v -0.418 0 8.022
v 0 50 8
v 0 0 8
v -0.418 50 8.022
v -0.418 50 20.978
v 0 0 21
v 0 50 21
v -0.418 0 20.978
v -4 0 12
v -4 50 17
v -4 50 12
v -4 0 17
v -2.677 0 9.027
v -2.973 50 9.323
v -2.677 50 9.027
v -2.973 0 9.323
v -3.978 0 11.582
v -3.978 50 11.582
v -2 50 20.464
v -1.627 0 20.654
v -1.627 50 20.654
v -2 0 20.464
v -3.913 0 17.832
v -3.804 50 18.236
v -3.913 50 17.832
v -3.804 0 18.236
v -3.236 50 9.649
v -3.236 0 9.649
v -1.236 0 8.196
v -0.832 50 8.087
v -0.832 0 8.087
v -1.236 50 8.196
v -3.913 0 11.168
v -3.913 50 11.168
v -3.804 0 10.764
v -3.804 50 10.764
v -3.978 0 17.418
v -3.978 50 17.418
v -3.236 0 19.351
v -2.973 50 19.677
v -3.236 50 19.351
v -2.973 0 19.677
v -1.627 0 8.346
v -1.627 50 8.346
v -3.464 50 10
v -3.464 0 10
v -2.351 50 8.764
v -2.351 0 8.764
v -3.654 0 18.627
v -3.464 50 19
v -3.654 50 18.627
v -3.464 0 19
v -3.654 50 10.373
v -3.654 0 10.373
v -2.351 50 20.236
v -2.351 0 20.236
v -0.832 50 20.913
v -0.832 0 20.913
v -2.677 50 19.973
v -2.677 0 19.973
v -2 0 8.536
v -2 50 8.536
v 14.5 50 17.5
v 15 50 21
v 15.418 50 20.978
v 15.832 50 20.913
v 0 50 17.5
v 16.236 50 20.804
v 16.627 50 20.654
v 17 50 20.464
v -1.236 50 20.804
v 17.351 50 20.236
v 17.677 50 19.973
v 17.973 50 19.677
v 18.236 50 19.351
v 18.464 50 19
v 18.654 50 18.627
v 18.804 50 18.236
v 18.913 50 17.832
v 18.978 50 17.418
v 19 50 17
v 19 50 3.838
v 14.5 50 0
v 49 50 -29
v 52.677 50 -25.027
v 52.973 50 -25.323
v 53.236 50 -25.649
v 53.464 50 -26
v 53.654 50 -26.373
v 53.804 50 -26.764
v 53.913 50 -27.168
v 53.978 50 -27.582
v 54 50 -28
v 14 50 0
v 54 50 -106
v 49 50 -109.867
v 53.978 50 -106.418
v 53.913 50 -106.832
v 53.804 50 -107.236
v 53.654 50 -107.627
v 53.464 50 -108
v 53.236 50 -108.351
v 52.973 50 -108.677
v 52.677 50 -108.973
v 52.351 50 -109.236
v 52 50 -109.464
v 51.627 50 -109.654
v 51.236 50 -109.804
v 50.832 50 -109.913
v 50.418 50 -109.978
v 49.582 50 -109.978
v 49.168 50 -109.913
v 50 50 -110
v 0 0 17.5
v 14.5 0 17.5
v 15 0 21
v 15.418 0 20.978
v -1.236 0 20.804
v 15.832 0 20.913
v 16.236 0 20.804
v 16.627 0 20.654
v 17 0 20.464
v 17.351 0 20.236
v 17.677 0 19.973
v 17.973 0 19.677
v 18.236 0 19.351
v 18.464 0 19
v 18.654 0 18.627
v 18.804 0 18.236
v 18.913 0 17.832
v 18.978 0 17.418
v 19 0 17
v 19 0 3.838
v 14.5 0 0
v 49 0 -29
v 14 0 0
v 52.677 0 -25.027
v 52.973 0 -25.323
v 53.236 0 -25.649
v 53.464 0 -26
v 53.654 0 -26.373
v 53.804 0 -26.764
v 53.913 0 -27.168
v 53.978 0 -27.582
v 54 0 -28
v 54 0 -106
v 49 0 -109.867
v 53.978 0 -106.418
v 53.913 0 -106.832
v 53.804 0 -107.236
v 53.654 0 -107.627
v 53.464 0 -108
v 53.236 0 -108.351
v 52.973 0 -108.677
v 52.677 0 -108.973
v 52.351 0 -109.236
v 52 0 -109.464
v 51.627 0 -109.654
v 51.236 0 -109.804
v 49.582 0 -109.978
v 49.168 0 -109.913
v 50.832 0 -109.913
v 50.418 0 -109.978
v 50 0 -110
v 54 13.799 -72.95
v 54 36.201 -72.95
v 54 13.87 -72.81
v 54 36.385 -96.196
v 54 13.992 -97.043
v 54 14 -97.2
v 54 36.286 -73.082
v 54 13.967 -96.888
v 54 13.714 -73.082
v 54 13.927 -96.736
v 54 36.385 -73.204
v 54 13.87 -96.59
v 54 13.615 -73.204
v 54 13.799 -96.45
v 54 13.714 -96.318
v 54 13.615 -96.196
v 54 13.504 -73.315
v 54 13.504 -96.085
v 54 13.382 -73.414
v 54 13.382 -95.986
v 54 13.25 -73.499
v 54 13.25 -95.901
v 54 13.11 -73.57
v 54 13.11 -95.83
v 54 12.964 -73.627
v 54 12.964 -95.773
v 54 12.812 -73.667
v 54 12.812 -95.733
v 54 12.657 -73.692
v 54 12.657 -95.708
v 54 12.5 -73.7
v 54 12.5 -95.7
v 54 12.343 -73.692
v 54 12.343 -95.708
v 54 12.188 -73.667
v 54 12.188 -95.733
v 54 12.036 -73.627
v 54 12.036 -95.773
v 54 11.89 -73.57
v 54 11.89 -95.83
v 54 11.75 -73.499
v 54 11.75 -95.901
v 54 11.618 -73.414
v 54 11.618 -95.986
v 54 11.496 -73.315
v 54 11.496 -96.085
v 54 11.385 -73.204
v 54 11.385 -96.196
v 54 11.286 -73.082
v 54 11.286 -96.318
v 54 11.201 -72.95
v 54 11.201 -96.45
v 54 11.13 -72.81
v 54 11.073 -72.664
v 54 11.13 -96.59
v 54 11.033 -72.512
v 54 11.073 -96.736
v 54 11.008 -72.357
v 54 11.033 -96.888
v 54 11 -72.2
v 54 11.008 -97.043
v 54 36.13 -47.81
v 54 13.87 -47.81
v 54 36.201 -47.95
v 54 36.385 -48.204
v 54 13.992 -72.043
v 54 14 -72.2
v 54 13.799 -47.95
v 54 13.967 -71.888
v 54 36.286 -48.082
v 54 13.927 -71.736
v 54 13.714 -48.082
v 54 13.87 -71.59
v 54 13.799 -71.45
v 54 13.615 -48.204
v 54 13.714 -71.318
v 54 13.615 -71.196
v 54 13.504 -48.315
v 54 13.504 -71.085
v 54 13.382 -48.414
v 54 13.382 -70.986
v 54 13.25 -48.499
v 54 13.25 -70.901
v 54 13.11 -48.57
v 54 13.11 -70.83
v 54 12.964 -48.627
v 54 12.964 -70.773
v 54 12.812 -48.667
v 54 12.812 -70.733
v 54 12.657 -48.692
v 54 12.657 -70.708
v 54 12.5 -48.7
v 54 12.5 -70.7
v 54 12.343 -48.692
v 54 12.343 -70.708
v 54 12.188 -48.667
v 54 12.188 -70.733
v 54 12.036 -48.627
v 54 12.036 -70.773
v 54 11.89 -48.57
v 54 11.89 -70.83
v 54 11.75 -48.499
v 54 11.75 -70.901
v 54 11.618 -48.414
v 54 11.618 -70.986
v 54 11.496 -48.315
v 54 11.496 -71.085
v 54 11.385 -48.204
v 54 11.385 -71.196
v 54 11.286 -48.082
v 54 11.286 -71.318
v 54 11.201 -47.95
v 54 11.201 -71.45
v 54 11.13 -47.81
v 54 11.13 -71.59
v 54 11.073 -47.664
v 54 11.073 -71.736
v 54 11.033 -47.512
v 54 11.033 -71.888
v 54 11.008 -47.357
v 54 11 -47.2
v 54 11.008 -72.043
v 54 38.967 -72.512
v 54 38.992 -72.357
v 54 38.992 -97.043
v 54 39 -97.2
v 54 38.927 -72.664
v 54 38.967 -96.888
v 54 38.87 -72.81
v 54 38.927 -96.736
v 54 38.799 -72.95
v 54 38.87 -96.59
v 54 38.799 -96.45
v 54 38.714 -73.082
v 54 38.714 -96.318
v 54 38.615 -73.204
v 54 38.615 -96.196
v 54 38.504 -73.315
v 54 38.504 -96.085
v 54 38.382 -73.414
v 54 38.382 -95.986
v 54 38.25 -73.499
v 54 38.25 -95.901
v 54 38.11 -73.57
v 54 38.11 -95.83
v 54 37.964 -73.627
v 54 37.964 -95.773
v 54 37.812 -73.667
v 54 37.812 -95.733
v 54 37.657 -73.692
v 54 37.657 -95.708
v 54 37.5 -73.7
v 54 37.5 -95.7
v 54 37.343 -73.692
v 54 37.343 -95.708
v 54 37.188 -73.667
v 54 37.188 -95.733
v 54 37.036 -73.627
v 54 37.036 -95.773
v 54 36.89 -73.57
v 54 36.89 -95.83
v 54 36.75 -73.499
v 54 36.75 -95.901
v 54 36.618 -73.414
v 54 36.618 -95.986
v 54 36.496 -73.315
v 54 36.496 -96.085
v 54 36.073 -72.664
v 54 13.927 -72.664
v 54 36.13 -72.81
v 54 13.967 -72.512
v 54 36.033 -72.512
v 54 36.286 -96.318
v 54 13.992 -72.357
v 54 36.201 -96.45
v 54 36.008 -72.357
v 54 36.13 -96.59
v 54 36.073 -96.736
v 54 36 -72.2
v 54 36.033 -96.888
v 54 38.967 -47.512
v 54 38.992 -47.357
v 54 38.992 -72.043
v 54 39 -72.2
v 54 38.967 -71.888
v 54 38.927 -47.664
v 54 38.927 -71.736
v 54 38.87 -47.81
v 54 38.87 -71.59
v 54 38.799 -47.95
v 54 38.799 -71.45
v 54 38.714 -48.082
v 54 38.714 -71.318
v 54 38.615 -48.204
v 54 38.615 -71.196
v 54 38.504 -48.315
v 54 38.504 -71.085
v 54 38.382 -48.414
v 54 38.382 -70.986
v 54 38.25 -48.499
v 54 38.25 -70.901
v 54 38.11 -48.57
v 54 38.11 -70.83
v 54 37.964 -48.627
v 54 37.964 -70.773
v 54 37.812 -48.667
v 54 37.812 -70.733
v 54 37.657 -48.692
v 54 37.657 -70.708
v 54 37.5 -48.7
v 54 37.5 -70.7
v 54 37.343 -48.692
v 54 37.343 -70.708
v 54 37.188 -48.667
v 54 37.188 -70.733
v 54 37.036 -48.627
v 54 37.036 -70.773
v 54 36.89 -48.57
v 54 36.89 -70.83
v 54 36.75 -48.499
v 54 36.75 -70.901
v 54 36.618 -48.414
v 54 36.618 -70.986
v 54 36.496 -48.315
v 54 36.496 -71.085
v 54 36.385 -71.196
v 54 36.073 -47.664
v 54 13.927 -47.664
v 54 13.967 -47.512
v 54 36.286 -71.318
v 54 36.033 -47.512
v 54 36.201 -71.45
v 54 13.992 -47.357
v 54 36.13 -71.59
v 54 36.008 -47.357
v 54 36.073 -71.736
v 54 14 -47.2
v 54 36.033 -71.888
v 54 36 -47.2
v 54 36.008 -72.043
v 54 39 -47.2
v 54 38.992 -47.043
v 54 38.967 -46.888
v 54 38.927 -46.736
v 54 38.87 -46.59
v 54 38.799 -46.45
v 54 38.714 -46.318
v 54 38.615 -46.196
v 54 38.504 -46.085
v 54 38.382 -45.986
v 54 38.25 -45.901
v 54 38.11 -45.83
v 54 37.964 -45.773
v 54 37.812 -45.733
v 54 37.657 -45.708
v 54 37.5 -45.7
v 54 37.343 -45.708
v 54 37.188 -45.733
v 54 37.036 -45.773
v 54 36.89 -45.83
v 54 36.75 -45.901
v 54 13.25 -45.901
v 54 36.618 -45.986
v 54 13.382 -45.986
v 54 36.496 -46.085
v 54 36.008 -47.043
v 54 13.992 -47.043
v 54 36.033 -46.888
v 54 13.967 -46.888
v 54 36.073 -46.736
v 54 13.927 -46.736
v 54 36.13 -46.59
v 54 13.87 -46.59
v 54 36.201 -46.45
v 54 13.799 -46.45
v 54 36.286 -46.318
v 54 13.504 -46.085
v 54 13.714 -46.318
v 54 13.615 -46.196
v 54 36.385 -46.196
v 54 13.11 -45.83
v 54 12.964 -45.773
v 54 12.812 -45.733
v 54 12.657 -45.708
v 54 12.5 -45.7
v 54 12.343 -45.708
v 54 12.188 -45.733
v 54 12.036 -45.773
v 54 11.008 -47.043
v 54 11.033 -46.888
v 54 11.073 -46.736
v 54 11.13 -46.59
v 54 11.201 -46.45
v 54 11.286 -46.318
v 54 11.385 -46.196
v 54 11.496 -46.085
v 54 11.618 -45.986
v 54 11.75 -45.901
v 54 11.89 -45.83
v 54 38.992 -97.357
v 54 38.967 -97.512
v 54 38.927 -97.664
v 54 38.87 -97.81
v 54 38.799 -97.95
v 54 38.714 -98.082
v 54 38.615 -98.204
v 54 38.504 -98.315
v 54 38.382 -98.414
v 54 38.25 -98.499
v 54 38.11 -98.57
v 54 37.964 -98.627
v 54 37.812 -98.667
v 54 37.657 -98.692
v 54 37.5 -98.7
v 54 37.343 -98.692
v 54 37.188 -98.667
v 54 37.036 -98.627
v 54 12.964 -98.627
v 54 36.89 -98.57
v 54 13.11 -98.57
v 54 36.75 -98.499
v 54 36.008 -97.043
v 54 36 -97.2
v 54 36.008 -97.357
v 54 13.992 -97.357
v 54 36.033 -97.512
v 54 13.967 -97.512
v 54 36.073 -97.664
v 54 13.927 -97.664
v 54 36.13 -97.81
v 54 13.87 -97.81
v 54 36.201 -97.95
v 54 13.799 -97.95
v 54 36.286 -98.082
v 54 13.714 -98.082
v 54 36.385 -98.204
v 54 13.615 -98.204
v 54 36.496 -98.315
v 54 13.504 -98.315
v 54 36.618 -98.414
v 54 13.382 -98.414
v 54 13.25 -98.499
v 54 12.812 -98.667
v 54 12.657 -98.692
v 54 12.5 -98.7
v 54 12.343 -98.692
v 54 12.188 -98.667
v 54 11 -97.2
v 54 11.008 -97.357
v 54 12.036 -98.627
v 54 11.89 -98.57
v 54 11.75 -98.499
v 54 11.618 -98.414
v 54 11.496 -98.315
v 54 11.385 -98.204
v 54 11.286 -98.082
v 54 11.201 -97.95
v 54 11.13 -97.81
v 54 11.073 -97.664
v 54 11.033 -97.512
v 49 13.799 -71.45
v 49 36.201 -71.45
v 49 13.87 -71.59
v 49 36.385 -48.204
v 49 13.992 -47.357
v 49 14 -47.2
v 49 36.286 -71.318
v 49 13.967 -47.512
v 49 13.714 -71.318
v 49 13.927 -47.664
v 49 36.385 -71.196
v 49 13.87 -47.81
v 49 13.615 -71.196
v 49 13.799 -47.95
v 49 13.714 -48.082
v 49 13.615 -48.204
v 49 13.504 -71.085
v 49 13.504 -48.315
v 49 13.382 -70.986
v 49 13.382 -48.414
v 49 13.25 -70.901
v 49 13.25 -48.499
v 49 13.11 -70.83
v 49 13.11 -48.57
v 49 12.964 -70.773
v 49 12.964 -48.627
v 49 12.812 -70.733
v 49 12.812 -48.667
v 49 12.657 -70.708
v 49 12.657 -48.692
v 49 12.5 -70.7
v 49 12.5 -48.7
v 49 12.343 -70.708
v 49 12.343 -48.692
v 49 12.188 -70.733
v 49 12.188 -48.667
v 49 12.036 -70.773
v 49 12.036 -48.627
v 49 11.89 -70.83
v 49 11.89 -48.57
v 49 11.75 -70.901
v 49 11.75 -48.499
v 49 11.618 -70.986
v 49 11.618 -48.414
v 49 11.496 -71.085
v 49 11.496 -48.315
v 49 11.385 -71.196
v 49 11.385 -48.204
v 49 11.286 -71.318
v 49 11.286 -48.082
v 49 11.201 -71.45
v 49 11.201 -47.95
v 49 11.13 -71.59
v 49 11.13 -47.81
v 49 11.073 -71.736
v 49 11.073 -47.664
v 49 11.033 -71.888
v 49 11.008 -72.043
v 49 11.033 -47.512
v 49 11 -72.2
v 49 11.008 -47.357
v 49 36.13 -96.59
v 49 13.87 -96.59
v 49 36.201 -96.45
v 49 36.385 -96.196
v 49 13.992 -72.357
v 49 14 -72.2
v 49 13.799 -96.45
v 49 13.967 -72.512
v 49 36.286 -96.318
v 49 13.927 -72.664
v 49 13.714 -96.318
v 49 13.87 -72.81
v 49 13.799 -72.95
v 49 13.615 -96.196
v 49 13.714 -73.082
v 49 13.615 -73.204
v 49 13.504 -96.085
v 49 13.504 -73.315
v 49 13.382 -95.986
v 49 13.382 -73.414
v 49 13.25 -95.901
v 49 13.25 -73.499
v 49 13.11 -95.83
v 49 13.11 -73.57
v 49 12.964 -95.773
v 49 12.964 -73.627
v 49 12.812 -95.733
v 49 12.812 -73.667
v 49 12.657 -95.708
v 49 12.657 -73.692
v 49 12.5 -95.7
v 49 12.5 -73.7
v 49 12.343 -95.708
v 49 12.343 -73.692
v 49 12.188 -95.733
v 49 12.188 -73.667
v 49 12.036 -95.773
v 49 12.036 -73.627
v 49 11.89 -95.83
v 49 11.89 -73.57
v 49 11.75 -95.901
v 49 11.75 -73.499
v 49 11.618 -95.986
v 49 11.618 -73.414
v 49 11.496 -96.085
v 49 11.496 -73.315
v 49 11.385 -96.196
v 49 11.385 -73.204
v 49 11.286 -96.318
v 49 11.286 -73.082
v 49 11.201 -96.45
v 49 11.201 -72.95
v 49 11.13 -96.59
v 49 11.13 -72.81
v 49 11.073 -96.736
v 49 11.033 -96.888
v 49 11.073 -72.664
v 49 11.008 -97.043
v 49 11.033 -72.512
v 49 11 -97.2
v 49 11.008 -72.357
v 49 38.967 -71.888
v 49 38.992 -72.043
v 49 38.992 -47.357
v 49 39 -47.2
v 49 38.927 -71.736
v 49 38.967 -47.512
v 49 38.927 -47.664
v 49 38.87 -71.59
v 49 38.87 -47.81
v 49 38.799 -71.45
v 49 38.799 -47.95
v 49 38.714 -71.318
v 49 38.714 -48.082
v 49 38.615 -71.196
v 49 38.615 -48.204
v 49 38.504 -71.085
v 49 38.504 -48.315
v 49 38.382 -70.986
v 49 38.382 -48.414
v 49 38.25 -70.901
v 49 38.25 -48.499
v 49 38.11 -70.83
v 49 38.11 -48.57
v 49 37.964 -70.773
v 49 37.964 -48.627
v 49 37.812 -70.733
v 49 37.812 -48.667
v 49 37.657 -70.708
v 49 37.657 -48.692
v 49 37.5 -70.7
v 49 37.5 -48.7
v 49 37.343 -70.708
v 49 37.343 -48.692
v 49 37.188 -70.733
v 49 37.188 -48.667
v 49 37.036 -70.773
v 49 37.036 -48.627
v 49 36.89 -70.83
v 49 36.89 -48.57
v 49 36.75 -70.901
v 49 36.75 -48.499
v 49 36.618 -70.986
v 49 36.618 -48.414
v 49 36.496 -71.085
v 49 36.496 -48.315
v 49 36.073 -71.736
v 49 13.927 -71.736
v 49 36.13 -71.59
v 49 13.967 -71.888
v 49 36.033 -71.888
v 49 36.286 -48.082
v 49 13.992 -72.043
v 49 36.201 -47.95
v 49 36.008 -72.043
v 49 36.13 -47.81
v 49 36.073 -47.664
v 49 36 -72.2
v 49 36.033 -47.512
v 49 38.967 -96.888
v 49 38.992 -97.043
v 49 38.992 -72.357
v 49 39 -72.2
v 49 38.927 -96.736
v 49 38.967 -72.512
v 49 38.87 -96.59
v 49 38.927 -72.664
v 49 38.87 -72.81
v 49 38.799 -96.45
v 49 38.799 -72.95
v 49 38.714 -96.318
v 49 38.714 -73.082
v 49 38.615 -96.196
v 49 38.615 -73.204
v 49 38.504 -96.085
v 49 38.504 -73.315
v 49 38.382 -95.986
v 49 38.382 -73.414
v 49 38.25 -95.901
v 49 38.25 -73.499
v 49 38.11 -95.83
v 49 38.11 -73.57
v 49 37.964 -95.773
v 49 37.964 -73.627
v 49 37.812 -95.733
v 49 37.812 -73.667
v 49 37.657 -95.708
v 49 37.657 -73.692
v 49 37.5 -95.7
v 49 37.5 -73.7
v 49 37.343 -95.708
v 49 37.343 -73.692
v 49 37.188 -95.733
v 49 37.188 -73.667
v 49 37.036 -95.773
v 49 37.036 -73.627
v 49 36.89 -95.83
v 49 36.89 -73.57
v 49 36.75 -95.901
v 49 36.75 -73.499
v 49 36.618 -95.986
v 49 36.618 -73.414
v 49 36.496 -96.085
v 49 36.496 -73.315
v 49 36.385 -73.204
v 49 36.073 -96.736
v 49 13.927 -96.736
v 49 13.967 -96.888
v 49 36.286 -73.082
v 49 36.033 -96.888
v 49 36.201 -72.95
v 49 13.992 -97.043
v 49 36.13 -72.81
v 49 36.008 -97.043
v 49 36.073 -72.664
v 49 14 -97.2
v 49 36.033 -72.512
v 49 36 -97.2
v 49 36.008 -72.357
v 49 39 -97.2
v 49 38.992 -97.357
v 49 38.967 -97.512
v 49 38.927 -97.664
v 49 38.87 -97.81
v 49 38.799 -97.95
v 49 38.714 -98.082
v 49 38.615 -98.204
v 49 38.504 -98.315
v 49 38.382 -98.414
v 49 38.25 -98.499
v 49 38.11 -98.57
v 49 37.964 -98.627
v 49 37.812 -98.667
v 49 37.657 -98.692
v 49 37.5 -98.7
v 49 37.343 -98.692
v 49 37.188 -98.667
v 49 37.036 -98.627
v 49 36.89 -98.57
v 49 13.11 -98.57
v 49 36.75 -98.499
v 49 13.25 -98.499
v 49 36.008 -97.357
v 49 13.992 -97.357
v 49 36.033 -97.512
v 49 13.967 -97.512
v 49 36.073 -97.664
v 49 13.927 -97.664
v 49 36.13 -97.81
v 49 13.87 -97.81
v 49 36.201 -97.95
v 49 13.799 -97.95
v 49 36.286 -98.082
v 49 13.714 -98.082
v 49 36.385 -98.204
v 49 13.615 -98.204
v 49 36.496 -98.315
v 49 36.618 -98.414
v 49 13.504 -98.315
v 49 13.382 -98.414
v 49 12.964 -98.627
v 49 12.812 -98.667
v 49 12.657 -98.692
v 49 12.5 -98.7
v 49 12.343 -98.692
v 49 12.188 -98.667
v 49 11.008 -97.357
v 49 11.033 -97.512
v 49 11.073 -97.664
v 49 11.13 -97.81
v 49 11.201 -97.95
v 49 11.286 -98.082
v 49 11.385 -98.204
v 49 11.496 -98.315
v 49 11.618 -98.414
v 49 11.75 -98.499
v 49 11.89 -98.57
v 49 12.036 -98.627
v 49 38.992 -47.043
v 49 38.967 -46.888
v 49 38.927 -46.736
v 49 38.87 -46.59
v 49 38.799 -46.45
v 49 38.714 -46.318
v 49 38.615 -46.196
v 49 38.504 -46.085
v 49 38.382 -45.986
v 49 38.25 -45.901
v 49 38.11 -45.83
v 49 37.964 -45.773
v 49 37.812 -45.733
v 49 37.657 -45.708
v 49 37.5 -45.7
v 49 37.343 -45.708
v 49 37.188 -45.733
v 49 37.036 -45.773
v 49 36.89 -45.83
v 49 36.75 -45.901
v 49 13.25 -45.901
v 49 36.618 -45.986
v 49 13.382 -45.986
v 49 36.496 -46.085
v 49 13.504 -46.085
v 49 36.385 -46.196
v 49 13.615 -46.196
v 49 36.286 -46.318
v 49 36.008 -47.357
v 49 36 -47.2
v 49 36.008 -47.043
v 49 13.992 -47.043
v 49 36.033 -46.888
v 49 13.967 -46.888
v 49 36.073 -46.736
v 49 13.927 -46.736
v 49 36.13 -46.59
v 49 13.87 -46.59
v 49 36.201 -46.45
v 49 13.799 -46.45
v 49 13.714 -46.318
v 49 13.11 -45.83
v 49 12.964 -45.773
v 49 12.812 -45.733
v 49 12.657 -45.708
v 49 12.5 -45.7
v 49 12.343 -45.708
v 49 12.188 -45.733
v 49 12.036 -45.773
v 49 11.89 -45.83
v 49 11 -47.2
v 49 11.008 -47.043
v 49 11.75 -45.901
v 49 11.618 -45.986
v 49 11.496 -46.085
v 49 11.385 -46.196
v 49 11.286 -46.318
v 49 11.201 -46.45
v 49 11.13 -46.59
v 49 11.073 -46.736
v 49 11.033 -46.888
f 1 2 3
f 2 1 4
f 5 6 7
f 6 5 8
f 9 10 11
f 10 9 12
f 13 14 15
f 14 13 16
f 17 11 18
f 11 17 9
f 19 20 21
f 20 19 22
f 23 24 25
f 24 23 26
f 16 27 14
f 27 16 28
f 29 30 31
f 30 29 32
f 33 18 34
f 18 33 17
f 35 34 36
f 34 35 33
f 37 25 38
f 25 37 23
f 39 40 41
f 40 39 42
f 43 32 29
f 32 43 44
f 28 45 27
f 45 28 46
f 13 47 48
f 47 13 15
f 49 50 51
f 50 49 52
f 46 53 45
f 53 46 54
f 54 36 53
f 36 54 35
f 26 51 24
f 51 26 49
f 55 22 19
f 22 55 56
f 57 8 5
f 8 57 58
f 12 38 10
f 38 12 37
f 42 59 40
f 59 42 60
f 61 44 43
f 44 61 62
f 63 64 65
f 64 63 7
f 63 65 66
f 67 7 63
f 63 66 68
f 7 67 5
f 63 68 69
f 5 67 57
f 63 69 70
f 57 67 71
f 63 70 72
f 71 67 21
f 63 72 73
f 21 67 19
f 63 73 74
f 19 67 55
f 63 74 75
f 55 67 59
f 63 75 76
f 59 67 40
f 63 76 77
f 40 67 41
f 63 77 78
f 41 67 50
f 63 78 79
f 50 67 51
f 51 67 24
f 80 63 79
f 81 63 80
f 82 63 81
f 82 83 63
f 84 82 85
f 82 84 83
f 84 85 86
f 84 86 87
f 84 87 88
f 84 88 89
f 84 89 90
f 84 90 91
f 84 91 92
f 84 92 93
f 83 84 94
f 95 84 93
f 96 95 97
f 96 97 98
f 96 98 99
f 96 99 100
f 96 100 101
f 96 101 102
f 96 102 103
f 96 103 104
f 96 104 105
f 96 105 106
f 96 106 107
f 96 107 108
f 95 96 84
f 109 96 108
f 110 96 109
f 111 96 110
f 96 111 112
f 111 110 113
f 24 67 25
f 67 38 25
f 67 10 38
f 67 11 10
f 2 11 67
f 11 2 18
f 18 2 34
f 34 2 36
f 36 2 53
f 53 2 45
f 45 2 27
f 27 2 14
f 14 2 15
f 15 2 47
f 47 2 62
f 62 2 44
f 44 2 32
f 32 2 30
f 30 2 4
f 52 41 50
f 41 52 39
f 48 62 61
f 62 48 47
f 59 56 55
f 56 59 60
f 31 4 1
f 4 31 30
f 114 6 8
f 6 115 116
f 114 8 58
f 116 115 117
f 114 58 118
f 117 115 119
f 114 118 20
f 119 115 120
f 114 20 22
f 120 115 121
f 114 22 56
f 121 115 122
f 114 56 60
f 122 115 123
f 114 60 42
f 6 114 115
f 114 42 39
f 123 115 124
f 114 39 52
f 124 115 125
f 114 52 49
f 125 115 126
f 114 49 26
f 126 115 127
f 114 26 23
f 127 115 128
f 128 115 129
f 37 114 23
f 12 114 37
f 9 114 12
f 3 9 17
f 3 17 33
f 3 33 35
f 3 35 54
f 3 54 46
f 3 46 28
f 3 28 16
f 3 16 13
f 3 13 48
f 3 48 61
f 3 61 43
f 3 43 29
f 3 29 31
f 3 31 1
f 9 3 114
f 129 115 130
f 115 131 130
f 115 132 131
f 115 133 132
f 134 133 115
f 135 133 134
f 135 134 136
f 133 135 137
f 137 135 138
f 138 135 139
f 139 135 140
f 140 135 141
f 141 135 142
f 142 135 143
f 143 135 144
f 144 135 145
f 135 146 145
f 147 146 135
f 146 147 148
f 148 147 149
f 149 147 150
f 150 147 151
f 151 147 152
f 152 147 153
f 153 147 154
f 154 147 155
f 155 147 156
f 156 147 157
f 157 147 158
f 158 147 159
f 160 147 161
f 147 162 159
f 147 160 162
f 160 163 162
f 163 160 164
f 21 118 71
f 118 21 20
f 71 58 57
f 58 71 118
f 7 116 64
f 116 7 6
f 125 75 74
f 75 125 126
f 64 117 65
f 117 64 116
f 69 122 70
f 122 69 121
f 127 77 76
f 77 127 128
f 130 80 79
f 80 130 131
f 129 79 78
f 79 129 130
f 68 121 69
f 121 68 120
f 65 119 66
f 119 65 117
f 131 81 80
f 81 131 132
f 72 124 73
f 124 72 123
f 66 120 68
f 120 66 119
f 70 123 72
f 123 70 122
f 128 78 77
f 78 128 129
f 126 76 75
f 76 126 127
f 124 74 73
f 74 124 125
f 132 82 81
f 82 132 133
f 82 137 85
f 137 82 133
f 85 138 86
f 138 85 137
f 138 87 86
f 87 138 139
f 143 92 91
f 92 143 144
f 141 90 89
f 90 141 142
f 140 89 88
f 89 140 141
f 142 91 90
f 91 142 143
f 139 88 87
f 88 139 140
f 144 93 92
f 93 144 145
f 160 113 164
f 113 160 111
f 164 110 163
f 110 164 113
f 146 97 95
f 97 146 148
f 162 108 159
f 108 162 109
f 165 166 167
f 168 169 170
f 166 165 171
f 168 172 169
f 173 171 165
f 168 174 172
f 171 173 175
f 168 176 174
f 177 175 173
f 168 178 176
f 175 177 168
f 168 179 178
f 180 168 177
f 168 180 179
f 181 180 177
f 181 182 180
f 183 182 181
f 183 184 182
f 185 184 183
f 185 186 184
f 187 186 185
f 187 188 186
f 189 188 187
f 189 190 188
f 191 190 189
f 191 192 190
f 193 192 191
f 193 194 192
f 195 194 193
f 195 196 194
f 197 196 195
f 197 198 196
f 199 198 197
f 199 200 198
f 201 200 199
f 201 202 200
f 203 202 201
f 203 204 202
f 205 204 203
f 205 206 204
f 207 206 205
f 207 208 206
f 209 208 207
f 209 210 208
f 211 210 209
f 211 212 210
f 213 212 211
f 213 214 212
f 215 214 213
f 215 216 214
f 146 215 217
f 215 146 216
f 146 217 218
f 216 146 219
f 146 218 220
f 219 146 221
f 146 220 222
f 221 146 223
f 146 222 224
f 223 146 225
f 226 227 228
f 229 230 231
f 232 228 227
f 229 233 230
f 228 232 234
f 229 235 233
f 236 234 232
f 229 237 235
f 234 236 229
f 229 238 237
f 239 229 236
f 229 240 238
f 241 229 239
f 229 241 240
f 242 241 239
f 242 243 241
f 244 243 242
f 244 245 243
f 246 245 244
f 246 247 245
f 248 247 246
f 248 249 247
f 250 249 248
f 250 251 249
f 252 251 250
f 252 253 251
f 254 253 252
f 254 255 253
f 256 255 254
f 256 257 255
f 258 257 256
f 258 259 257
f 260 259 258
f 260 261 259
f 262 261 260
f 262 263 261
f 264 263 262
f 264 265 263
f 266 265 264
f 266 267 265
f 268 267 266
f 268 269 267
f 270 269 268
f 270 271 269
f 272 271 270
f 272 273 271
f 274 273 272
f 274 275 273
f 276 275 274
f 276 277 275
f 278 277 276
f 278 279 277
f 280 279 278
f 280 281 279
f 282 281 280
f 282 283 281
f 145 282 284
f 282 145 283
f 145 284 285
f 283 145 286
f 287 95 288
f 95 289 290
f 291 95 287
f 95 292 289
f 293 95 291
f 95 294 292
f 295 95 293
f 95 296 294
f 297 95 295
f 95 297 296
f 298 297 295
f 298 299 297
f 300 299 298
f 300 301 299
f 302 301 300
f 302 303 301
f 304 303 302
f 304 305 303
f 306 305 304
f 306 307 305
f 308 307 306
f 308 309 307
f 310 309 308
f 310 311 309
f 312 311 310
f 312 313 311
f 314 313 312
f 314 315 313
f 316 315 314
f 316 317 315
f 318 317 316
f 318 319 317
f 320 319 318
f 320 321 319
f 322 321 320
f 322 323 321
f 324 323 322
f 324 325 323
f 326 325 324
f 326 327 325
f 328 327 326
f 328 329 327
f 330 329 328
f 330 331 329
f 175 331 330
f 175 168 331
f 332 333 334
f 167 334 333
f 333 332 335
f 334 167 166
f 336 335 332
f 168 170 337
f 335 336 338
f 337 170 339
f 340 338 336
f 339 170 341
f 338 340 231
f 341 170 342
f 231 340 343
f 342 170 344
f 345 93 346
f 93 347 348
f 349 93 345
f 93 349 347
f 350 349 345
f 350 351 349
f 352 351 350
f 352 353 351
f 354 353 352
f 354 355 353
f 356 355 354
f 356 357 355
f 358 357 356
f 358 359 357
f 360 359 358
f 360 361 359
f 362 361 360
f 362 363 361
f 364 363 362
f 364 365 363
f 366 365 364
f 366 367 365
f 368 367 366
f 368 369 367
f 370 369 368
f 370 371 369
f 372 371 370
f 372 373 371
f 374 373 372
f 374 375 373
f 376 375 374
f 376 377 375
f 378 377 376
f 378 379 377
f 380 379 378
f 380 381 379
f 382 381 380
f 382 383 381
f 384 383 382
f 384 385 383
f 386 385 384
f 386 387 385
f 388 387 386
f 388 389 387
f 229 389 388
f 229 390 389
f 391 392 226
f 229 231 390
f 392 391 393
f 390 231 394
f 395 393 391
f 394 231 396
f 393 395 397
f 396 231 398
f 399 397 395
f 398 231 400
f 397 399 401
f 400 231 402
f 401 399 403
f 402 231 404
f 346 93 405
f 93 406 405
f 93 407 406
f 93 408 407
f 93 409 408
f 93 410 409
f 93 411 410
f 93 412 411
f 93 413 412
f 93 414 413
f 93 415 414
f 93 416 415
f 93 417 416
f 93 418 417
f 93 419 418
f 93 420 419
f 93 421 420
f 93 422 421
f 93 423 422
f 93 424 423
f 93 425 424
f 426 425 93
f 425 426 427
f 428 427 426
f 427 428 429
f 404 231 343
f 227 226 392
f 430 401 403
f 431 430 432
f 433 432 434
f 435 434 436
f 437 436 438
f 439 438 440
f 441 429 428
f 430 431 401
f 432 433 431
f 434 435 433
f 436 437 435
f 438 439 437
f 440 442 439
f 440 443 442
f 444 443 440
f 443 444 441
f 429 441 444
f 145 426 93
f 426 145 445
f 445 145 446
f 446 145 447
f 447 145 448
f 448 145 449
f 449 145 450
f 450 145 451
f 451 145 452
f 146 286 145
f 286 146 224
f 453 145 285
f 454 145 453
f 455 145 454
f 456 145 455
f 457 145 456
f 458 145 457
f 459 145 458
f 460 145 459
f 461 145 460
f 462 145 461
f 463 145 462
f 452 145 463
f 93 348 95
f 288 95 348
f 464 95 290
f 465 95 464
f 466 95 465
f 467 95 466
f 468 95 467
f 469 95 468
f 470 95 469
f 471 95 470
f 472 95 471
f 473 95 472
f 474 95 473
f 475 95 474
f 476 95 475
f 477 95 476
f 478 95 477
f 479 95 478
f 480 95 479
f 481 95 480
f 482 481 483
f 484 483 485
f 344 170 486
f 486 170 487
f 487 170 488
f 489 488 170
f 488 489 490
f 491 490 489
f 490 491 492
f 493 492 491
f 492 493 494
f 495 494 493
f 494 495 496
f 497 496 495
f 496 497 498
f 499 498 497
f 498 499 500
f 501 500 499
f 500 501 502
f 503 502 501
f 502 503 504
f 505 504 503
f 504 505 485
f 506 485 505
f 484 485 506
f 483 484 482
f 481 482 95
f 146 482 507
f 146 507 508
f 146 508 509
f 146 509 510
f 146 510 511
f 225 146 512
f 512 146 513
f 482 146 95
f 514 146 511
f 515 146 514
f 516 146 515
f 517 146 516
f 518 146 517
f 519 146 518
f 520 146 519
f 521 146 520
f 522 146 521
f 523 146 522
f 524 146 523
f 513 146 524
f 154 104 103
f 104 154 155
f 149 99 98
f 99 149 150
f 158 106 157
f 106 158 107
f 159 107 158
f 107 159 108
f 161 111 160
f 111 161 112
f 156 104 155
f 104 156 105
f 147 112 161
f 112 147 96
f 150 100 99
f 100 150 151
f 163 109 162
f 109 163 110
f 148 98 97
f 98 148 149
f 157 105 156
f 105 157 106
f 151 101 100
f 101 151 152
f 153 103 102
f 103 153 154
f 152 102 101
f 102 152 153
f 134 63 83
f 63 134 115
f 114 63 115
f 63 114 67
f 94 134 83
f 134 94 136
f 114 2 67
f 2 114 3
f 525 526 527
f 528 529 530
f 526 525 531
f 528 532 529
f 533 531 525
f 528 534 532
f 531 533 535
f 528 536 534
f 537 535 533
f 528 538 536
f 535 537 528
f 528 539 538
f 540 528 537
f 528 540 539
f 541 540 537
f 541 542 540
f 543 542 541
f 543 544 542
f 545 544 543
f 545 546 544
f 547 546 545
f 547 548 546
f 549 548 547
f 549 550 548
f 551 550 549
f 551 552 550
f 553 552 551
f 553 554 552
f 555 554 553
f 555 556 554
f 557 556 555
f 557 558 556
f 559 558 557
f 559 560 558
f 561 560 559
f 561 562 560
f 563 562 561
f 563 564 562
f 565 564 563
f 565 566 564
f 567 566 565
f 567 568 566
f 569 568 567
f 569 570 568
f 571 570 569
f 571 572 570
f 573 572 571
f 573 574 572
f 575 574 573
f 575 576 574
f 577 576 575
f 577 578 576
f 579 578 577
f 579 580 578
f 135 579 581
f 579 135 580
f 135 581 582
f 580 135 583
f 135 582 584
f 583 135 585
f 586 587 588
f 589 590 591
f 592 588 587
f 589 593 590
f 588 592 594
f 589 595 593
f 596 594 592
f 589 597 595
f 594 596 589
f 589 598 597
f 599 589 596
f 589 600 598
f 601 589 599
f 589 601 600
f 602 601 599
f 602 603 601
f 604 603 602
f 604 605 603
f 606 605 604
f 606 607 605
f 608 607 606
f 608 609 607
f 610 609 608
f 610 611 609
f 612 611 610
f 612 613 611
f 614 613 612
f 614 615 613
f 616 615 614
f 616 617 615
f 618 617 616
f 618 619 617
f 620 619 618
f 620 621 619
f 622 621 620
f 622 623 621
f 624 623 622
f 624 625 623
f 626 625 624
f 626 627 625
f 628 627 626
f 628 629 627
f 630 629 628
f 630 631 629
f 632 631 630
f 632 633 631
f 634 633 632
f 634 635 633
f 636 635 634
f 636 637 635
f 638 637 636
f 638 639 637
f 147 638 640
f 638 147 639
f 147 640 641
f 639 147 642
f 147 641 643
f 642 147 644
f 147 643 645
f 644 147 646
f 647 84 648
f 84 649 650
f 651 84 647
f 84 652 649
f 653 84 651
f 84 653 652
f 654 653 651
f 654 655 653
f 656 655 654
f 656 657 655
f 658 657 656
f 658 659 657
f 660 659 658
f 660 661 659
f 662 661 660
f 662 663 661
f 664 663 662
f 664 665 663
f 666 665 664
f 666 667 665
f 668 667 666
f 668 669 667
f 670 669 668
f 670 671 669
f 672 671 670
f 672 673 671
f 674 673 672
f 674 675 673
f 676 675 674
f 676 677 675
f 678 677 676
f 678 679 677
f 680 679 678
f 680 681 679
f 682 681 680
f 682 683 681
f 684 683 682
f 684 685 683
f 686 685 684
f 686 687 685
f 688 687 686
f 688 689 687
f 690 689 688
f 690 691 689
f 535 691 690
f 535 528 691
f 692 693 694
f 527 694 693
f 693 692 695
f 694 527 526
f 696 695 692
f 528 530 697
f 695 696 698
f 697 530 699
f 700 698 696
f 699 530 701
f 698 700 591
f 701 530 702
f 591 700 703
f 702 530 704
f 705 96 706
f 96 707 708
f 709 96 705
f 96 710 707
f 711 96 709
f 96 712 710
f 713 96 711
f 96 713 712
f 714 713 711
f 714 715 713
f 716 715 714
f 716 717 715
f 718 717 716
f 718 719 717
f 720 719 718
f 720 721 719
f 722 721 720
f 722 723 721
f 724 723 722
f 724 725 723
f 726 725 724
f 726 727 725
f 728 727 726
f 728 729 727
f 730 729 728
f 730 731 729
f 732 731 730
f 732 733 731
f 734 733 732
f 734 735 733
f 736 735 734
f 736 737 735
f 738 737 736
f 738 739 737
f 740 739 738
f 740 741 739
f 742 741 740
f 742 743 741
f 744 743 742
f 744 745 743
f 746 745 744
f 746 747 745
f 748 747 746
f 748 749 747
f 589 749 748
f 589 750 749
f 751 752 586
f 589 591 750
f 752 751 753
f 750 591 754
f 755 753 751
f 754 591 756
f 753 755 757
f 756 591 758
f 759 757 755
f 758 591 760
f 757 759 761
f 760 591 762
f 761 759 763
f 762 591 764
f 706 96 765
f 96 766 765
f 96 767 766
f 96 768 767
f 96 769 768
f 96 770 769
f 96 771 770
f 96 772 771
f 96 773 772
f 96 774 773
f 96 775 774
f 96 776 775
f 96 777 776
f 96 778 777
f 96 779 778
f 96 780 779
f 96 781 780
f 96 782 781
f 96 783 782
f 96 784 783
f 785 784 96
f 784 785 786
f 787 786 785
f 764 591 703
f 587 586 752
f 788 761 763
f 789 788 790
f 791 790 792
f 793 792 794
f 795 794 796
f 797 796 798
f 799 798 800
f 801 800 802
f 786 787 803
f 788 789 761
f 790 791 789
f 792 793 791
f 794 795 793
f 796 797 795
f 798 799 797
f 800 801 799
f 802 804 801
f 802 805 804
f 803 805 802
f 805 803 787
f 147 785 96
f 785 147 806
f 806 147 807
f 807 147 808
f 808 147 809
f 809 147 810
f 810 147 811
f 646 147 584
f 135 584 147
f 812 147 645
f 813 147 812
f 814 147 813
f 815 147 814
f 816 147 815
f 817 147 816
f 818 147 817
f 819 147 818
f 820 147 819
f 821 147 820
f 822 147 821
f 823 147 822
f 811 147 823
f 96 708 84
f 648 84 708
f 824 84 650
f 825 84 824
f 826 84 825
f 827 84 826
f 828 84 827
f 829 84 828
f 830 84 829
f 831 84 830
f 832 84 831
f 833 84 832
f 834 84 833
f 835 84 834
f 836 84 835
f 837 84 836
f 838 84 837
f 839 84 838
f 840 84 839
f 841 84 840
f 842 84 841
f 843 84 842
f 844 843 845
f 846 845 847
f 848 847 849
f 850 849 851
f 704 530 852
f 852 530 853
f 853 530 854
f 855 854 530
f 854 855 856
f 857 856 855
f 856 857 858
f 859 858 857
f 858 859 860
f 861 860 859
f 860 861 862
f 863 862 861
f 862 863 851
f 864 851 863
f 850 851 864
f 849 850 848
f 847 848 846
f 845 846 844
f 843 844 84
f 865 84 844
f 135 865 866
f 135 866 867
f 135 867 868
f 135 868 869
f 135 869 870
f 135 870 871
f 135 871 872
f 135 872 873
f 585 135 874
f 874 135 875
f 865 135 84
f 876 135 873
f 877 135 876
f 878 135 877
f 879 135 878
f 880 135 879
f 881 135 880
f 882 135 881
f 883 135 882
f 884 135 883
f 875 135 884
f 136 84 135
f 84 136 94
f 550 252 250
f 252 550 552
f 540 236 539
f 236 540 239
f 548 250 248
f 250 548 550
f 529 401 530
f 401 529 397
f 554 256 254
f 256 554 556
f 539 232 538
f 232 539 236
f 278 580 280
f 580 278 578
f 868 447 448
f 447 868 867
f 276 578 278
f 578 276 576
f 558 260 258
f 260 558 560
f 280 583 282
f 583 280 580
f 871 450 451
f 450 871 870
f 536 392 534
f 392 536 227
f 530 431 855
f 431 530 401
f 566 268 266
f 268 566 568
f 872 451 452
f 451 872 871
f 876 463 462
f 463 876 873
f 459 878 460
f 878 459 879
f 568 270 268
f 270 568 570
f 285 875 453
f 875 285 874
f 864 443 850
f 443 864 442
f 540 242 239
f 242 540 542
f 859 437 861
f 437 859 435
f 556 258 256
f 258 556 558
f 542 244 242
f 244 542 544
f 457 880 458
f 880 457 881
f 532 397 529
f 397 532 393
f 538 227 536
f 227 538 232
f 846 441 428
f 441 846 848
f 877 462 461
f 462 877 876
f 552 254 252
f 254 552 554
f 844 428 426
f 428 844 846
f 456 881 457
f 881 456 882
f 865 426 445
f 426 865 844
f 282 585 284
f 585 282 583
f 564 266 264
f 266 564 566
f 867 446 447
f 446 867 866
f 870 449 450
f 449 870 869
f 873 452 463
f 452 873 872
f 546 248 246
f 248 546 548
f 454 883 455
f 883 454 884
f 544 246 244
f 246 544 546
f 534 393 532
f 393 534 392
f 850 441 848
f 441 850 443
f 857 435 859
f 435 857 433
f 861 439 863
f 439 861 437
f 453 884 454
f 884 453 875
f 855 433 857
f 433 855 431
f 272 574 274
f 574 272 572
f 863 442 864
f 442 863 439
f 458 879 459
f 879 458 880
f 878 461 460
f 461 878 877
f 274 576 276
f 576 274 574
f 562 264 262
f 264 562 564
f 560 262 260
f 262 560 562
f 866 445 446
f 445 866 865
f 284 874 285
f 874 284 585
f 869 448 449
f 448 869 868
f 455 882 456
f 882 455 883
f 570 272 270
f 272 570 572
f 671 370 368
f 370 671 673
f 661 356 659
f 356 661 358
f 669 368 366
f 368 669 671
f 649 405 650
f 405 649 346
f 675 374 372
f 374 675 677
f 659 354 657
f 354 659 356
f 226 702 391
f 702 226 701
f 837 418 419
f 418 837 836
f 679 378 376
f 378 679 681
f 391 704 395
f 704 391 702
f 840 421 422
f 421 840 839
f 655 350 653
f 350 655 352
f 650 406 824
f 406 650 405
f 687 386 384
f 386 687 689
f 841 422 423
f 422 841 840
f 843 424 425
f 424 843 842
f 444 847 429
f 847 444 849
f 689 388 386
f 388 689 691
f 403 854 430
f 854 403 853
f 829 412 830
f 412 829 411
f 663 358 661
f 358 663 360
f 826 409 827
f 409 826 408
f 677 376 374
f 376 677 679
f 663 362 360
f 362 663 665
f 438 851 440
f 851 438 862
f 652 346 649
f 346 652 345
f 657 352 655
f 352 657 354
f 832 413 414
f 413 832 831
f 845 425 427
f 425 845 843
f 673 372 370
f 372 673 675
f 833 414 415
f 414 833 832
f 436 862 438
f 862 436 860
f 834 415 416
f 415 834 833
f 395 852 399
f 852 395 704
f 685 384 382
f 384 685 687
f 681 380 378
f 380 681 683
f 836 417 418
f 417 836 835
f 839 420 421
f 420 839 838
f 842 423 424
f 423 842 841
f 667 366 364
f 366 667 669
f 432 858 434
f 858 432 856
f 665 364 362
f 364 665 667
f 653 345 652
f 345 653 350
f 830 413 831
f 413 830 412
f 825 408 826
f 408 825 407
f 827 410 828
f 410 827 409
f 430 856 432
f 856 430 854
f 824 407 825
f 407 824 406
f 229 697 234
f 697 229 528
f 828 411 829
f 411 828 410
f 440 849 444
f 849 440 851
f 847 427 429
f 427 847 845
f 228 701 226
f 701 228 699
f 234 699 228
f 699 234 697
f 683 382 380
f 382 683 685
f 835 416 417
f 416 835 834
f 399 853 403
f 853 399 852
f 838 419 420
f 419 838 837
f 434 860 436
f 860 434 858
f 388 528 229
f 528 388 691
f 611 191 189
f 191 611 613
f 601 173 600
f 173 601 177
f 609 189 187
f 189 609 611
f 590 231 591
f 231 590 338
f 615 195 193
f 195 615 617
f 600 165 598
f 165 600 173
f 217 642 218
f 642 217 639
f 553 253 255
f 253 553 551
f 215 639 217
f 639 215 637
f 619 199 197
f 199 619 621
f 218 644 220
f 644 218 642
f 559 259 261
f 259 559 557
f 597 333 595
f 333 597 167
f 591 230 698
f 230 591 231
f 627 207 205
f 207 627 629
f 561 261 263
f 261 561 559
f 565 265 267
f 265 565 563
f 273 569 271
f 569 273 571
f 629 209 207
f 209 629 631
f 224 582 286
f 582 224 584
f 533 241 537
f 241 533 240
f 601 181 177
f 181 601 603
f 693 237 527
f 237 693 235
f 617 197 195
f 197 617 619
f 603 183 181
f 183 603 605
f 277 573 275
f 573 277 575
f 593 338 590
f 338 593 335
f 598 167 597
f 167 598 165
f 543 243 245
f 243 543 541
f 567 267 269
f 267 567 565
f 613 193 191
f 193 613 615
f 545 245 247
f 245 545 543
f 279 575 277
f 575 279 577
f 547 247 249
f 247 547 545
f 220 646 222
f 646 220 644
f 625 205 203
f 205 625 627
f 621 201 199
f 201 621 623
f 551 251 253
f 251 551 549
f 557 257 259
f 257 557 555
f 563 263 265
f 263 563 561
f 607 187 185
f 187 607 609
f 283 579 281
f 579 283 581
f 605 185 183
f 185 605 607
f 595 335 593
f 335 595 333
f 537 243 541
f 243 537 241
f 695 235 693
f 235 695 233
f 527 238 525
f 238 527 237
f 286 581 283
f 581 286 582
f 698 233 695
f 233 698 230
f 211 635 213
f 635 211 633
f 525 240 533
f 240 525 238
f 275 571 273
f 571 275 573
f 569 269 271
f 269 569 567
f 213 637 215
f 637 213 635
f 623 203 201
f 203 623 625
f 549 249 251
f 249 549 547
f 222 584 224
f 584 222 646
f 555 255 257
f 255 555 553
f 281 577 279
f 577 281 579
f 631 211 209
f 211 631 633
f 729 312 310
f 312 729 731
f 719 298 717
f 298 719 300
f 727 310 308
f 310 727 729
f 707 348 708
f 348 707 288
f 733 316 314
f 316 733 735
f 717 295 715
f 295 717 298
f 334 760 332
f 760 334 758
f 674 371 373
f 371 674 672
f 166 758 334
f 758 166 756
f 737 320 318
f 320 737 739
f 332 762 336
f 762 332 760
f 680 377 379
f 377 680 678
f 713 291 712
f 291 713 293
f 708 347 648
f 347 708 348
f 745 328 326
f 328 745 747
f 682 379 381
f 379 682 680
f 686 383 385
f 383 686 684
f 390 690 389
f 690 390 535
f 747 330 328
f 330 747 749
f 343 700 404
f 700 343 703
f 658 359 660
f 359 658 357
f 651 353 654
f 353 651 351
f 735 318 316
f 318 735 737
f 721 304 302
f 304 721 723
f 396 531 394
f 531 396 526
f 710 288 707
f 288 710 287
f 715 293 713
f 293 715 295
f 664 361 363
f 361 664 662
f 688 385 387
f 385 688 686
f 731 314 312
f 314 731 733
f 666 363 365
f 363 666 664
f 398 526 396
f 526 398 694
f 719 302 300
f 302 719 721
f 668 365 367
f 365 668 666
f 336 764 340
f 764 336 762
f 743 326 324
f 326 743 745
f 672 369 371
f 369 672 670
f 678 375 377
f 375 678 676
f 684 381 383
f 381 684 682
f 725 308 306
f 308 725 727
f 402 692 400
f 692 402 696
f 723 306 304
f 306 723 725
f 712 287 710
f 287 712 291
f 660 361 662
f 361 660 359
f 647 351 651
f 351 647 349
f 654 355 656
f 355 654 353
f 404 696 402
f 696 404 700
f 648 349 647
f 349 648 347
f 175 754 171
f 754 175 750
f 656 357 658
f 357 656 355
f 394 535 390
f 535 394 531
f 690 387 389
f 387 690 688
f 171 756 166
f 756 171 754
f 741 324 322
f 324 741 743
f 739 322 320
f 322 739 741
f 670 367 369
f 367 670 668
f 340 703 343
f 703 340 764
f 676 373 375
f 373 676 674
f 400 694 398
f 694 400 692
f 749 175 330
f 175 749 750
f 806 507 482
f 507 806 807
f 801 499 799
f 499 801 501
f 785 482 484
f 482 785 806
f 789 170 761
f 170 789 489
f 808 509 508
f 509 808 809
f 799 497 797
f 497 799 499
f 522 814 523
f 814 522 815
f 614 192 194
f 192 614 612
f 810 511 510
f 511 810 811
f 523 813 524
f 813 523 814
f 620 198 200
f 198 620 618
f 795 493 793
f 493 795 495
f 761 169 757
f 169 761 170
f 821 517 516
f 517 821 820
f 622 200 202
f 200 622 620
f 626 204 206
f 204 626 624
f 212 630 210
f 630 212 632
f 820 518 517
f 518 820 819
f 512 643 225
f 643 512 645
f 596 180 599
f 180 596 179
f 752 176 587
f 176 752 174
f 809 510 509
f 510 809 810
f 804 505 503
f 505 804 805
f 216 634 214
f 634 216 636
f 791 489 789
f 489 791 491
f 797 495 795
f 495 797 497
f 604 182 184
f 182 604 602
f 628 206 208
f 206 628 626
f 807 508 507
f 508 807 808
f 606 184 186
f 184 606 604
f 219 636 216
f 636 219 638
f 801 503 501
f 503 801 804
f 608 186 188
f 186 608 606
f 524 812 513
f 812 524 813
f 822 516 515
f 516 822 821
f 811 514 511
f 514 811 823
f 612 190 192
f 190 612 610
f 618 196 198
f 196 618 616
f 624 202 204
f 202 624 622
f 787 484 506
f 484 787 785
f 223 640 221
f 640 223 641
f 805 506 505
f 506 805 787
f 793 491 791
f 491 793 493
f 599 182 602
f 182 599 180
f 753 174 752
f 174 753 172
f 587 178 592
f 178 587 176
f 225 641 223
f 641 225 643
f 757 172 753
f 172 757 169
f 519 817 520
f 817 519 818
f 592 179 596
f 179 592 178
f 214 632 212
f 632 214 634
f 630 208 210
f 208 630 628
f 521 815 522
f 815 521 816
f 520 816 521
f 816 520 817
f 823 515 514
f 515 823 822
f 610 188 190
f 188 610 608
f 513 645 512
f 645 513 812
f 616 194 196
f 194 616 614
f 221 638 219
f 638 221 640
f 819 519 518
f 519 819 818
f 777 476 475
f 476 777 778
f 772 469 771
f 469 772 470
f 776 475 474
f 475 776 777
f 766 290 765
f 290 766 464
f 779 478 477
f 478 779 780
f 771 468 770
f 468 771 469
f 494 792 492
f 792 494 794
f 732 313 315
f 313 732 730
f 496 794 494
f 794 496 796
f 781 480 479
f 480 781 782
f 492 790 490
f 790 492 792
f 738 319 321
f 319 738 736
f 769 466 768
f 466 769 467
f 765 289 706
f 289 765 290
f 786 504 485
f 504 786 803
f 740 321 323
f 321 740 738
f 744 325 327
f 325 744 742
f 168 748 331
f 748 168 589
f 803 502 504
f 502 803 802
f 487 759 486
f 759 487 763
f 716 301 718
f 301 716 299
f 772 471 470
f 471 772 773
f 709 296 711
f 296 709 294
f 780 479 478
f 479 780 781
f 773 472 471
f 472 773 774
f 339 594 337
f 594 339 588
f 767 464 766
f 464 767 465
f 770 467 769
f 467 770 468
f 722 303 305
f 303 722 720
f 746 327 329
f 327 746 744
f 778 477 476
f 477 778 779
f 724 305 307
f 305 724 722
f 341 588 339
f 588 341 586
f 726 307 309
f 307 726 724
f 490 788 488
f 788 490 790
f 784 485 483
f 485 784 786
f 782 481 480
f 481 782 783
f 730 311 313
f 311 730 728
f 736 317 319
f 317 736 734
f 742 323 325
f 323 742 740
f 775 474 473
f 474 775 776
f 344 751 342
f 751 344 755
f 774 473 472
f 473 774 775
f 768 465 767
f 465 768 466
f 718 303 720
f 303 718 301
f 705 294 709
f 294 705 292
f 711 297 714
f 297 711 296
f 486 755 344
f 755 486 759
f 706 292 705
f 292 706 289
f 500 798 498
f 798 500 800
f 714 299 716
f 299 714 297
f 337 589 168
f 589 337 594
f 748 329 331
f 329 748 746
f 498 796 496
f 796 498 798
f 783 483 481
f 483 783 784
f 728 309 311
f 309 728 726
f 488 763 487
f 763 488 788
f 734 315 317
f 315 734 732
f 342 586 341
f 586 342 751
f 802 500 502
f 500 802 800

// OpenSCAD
$fn=60;
//mount_test();

height=276;
ps4_width=53;
strap_width=50;
sq_nutX=5.6;
sq_nutY=2.2;
//
//%tv_frame();
//%translate([86,200,0]) rotate([90,0,180])
tv_frame_hook(width=strap_width);
//ps4_mount();

module mount_test(){
    difference(){
        cube([25,85,1], center=true);
        for(Y=[-2,-1,0,1,2]){
            translate([0,16.5*Y,0]) cylinder(d=7.5, h=6, center=true);
        }
    }
}

module tv_frame_hook(width=20, offset=35, length=80){
    difference(){
        union(){
            hull(){
                translate([0,0,20-3]) rotate([-90,0,0]) 
                    cylinder(d=8, h=width);
                translate([0,0,20-3-5]) rotate([-90,0,0]) 
                    cylinder(d=8, h=width);
            }
            hull(){
                translate([0,0,20-3]) rotate([-90,0,0]) 
                    cylinder(d=8, h=width);
                translate([15,0,20-3]) rotate([-90,0,0]) 
                    cylinder(d=8, h=width);
            }
            hull(){
                translate([15,0,20-3]) rotate([-90,0,0]) 
                    cylinder(d=8, h=width);
                translate([15,0,20-3-15]) rotate([-90,0,0]) 
                    cylinder(d=8, h=width);
            }
            hull(){
                translate([15,0,20-3-15]) rotate([-90,0,0]) 
                    cylinder(d=8, h=width);
                translate([15+offset,0,20-3-45]) rotate([-90,0,0]) 
                    cylinder(d=8, h=width);
            }
            hull(){
                translate([15+offset,0,20-3-45]) rotate([-90,0,0]) 
                    cylinder(d=8, h=width);
                translate([15+offset,0,20-45-length-1]) rotate([-90,0,0]) 
                    cylinder(d=8, h=width);
            }
        }
        tv_frame(width, offset, length);
        for(Z=[-50,-75,-100]){
          for(Y=[.25,.75]) translate([28,width*Y,Z+sq_nutX/2]) 
              rotate([0,90,0]) cylinder(d=3, h=200, center=true);
        }
    }
}
module tv_frame(width=20, offset=32.5, length=50){
    cube([14.5,width,17.5]);
    hull(){
        translate([0,0,-1]) cube([14,width,1]);
        translate([0,0,-30]) cube([14+offset,width,1]);
    }
    translate([0,0,-30-length]) cube([14+offset,width,length]);
}

module ps4_mount(width=50){
  difference(){
    hull() for(Y=[-1,1])
      translate([0,height/2*Y,0]) rotate([0,0,30]) 
        cylinder(d=80, h=width, $fn=$fn);
    translate([-ps4_width/2,-height/2,-1]) 
            cube([ps4_width,height,width+2]);
//    translate([32,90,0]) %cube([8,75,width]);
    translate([40-4,90+4,0])
      hull() for(Y=[0,100]) translate([0,Y,-1]) cylinder(d=8, h=width+2);
    for(Y=[100,125,150]){
      translate([28,Y,-1]) 
        cube([sq_nutY,sq_nutX,width+2], center=false);
        for(Z=[.25,.75]) translate([28,Y+sq_nutX/2,width*Z]) 
          rotate([0,90,0]) cylinder(d=3, h=20, center=true);
    }
  }
}
